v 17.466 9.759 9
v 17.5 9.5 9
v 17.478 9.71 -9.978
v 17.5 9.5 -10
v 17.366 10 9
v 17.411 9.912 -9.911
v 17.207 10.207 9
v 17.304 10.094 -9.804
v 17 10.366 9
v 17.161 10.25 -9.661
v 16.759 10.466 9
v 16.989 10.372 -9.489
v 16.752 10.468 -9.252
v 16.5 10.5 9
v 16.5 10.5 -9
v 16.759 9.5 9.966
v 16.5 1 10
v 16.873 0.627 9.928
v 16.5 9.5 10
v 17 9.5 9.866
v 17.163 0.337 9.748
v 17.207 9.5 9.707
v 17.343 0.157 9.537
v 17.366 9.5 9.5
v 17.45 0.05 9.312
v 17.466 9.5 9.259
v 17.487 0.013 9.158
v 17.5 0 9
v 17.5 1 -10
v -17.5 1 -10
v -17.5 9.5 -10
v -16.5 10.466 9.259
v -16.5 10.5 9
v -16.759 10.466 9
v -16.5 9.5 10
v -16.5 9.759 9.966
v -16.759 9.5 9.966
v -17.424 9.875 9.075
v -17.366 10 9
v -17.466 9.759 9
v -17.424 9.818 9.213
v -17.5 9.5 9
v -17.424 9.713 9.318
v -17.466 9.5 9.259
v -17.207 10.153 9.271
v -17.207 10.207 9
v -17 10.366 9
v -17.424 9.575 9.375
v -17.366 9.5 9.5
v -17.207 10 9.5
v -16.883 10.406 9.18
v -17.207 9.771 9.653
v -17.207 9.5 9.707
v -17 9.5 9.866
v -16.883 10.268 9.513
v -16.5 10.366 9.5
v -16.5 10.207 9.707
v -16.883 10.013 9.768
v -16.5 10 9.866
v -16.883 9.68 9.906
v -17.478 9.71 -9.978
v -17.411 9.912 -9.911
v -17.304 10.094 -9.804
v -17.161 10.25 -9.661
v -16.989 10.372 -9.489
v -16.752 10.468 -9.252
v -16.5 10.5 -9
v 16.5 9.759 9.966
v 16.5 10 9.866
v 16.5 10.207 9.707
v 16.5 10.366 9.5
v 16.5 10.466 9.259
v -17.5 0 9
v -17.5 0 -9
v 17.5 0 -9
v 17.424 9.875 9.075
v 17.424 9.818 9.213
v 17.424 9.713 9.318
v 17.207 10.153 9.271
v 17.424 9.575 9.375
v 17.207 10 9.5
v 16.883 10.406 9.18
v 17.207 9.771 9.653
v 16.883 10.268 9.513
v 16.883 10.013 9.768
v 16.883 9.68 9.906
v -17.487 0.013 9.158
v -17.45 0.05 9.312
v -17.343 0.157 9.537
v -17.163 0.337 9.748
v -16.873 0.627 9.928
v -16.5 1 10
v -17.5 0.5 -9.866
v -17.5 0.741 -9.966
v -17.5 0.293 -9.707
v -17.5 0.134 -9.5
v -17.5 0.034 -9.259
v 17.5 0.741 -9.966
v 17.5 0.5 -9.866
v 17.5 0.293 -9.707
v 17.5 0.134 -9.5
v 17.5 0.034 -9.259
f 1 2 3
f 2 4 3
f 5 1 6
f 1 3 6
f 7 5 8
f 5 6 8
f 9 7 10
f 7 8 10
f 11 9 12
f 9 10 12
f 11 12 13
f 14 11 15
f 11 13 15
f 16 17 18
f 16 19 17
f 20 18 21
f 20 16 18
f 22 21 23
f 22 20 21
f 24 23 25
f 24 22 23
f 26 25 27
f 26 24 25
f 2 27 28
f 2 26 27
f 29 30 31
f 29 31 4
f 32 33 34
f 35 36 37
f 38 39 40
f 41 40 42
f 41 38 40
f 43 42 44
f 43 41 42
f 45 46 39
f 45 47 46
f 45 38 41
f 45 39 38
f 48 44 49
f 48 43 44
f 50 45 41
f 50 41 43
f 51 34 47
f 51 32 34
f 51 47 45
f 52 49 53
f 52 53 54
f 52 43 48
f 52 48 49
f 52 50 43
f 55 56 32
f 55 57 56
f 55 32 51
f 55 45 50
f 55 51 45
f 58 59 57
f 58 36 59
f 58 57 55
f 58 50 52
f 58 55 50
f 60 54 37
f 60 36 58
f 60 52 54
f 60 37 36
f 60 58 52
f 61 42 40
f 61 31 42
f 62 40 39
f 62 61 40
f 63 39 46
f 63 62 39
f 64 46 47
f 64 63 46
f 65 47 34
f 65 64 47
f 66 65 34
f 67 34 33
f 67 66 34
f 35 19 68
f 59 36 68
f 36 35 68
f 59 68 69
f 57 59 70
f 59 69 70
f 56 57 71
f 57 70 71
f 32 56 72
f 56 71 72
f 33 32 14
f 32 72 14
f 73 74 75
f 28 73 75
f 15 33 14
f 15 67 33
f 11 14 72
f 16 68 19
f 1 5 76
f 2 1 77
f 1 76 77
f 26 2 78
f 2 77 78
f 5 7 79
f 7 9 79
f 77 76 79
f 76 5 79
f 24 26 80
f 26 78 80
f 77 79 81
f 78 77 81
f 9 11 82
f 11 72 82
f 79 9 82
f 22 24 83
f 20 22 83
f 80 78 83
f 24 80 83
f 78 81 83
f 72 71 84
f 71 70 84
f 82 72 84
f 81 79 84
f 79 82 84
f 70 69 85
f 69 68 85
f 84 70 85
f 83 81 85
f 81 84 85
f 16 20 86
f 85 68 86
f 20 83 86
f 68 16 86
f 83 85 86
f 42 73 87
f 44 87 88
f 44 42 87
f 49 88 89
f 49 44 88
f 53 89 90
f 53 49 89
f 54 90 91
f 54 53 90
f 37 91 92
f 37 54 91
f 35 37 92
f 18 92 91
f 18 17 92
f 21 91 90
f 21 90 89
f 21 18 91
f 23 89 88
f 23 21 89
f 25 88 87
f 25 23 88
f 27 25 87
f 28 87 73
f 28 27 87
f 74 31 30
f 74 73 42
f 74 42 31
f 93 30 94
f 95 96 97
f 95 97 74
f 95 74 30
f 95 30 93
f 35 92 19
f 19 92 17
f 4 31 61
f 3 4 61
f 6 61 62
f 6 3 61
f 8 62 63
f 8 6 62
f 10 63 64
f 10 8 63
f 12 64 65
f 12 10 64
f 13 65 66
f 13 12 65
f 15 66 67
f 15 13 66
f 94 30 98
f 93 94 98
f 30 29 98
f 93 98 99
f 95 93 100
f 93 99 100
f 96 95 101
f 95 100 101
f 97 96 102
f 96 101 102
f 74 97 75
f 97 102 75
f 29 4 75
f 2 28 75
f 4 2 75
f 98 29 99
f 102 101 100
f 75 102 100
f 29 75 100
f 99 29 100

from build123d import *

# Parameters (mm, degrees)
SKETCH_1_W      = 35
SKETCH_1_H      = 20
EXTRUDE_1_DEPTH = 10.5
FILLET_1_R      = 1


with BuildPart() as part:
    # 草图1 → 凸台-拉伸1 (new body)
    with BuildSketch(Plane(origin=(0, 0, 0), x_dir=(1, 0, 0), z_dir=(0, 1, 0))):
        Rectangle(SKETCH_1_W, SKETCH_1_H)
    extrude(amount=EXTRUDE_1_DEPTH)

    # 圆角1
    fillet_1_edges = [part.edges().sort_by_distance(p)[0] for p in [
        (0, 10.5, 10),
        (17.5, 10.5, 0),
        (0, 10.5, -10),
        (0, 0, 10),
        (0, 0, -10),
        (-17.5, 10.5, 0),
        (17.5, 5.25, 10),
        (-17.5, 5.25, 10),
    ]]
    fillet(fillet_1_edges, radius=FILLET_1_R)


solid = part.part
